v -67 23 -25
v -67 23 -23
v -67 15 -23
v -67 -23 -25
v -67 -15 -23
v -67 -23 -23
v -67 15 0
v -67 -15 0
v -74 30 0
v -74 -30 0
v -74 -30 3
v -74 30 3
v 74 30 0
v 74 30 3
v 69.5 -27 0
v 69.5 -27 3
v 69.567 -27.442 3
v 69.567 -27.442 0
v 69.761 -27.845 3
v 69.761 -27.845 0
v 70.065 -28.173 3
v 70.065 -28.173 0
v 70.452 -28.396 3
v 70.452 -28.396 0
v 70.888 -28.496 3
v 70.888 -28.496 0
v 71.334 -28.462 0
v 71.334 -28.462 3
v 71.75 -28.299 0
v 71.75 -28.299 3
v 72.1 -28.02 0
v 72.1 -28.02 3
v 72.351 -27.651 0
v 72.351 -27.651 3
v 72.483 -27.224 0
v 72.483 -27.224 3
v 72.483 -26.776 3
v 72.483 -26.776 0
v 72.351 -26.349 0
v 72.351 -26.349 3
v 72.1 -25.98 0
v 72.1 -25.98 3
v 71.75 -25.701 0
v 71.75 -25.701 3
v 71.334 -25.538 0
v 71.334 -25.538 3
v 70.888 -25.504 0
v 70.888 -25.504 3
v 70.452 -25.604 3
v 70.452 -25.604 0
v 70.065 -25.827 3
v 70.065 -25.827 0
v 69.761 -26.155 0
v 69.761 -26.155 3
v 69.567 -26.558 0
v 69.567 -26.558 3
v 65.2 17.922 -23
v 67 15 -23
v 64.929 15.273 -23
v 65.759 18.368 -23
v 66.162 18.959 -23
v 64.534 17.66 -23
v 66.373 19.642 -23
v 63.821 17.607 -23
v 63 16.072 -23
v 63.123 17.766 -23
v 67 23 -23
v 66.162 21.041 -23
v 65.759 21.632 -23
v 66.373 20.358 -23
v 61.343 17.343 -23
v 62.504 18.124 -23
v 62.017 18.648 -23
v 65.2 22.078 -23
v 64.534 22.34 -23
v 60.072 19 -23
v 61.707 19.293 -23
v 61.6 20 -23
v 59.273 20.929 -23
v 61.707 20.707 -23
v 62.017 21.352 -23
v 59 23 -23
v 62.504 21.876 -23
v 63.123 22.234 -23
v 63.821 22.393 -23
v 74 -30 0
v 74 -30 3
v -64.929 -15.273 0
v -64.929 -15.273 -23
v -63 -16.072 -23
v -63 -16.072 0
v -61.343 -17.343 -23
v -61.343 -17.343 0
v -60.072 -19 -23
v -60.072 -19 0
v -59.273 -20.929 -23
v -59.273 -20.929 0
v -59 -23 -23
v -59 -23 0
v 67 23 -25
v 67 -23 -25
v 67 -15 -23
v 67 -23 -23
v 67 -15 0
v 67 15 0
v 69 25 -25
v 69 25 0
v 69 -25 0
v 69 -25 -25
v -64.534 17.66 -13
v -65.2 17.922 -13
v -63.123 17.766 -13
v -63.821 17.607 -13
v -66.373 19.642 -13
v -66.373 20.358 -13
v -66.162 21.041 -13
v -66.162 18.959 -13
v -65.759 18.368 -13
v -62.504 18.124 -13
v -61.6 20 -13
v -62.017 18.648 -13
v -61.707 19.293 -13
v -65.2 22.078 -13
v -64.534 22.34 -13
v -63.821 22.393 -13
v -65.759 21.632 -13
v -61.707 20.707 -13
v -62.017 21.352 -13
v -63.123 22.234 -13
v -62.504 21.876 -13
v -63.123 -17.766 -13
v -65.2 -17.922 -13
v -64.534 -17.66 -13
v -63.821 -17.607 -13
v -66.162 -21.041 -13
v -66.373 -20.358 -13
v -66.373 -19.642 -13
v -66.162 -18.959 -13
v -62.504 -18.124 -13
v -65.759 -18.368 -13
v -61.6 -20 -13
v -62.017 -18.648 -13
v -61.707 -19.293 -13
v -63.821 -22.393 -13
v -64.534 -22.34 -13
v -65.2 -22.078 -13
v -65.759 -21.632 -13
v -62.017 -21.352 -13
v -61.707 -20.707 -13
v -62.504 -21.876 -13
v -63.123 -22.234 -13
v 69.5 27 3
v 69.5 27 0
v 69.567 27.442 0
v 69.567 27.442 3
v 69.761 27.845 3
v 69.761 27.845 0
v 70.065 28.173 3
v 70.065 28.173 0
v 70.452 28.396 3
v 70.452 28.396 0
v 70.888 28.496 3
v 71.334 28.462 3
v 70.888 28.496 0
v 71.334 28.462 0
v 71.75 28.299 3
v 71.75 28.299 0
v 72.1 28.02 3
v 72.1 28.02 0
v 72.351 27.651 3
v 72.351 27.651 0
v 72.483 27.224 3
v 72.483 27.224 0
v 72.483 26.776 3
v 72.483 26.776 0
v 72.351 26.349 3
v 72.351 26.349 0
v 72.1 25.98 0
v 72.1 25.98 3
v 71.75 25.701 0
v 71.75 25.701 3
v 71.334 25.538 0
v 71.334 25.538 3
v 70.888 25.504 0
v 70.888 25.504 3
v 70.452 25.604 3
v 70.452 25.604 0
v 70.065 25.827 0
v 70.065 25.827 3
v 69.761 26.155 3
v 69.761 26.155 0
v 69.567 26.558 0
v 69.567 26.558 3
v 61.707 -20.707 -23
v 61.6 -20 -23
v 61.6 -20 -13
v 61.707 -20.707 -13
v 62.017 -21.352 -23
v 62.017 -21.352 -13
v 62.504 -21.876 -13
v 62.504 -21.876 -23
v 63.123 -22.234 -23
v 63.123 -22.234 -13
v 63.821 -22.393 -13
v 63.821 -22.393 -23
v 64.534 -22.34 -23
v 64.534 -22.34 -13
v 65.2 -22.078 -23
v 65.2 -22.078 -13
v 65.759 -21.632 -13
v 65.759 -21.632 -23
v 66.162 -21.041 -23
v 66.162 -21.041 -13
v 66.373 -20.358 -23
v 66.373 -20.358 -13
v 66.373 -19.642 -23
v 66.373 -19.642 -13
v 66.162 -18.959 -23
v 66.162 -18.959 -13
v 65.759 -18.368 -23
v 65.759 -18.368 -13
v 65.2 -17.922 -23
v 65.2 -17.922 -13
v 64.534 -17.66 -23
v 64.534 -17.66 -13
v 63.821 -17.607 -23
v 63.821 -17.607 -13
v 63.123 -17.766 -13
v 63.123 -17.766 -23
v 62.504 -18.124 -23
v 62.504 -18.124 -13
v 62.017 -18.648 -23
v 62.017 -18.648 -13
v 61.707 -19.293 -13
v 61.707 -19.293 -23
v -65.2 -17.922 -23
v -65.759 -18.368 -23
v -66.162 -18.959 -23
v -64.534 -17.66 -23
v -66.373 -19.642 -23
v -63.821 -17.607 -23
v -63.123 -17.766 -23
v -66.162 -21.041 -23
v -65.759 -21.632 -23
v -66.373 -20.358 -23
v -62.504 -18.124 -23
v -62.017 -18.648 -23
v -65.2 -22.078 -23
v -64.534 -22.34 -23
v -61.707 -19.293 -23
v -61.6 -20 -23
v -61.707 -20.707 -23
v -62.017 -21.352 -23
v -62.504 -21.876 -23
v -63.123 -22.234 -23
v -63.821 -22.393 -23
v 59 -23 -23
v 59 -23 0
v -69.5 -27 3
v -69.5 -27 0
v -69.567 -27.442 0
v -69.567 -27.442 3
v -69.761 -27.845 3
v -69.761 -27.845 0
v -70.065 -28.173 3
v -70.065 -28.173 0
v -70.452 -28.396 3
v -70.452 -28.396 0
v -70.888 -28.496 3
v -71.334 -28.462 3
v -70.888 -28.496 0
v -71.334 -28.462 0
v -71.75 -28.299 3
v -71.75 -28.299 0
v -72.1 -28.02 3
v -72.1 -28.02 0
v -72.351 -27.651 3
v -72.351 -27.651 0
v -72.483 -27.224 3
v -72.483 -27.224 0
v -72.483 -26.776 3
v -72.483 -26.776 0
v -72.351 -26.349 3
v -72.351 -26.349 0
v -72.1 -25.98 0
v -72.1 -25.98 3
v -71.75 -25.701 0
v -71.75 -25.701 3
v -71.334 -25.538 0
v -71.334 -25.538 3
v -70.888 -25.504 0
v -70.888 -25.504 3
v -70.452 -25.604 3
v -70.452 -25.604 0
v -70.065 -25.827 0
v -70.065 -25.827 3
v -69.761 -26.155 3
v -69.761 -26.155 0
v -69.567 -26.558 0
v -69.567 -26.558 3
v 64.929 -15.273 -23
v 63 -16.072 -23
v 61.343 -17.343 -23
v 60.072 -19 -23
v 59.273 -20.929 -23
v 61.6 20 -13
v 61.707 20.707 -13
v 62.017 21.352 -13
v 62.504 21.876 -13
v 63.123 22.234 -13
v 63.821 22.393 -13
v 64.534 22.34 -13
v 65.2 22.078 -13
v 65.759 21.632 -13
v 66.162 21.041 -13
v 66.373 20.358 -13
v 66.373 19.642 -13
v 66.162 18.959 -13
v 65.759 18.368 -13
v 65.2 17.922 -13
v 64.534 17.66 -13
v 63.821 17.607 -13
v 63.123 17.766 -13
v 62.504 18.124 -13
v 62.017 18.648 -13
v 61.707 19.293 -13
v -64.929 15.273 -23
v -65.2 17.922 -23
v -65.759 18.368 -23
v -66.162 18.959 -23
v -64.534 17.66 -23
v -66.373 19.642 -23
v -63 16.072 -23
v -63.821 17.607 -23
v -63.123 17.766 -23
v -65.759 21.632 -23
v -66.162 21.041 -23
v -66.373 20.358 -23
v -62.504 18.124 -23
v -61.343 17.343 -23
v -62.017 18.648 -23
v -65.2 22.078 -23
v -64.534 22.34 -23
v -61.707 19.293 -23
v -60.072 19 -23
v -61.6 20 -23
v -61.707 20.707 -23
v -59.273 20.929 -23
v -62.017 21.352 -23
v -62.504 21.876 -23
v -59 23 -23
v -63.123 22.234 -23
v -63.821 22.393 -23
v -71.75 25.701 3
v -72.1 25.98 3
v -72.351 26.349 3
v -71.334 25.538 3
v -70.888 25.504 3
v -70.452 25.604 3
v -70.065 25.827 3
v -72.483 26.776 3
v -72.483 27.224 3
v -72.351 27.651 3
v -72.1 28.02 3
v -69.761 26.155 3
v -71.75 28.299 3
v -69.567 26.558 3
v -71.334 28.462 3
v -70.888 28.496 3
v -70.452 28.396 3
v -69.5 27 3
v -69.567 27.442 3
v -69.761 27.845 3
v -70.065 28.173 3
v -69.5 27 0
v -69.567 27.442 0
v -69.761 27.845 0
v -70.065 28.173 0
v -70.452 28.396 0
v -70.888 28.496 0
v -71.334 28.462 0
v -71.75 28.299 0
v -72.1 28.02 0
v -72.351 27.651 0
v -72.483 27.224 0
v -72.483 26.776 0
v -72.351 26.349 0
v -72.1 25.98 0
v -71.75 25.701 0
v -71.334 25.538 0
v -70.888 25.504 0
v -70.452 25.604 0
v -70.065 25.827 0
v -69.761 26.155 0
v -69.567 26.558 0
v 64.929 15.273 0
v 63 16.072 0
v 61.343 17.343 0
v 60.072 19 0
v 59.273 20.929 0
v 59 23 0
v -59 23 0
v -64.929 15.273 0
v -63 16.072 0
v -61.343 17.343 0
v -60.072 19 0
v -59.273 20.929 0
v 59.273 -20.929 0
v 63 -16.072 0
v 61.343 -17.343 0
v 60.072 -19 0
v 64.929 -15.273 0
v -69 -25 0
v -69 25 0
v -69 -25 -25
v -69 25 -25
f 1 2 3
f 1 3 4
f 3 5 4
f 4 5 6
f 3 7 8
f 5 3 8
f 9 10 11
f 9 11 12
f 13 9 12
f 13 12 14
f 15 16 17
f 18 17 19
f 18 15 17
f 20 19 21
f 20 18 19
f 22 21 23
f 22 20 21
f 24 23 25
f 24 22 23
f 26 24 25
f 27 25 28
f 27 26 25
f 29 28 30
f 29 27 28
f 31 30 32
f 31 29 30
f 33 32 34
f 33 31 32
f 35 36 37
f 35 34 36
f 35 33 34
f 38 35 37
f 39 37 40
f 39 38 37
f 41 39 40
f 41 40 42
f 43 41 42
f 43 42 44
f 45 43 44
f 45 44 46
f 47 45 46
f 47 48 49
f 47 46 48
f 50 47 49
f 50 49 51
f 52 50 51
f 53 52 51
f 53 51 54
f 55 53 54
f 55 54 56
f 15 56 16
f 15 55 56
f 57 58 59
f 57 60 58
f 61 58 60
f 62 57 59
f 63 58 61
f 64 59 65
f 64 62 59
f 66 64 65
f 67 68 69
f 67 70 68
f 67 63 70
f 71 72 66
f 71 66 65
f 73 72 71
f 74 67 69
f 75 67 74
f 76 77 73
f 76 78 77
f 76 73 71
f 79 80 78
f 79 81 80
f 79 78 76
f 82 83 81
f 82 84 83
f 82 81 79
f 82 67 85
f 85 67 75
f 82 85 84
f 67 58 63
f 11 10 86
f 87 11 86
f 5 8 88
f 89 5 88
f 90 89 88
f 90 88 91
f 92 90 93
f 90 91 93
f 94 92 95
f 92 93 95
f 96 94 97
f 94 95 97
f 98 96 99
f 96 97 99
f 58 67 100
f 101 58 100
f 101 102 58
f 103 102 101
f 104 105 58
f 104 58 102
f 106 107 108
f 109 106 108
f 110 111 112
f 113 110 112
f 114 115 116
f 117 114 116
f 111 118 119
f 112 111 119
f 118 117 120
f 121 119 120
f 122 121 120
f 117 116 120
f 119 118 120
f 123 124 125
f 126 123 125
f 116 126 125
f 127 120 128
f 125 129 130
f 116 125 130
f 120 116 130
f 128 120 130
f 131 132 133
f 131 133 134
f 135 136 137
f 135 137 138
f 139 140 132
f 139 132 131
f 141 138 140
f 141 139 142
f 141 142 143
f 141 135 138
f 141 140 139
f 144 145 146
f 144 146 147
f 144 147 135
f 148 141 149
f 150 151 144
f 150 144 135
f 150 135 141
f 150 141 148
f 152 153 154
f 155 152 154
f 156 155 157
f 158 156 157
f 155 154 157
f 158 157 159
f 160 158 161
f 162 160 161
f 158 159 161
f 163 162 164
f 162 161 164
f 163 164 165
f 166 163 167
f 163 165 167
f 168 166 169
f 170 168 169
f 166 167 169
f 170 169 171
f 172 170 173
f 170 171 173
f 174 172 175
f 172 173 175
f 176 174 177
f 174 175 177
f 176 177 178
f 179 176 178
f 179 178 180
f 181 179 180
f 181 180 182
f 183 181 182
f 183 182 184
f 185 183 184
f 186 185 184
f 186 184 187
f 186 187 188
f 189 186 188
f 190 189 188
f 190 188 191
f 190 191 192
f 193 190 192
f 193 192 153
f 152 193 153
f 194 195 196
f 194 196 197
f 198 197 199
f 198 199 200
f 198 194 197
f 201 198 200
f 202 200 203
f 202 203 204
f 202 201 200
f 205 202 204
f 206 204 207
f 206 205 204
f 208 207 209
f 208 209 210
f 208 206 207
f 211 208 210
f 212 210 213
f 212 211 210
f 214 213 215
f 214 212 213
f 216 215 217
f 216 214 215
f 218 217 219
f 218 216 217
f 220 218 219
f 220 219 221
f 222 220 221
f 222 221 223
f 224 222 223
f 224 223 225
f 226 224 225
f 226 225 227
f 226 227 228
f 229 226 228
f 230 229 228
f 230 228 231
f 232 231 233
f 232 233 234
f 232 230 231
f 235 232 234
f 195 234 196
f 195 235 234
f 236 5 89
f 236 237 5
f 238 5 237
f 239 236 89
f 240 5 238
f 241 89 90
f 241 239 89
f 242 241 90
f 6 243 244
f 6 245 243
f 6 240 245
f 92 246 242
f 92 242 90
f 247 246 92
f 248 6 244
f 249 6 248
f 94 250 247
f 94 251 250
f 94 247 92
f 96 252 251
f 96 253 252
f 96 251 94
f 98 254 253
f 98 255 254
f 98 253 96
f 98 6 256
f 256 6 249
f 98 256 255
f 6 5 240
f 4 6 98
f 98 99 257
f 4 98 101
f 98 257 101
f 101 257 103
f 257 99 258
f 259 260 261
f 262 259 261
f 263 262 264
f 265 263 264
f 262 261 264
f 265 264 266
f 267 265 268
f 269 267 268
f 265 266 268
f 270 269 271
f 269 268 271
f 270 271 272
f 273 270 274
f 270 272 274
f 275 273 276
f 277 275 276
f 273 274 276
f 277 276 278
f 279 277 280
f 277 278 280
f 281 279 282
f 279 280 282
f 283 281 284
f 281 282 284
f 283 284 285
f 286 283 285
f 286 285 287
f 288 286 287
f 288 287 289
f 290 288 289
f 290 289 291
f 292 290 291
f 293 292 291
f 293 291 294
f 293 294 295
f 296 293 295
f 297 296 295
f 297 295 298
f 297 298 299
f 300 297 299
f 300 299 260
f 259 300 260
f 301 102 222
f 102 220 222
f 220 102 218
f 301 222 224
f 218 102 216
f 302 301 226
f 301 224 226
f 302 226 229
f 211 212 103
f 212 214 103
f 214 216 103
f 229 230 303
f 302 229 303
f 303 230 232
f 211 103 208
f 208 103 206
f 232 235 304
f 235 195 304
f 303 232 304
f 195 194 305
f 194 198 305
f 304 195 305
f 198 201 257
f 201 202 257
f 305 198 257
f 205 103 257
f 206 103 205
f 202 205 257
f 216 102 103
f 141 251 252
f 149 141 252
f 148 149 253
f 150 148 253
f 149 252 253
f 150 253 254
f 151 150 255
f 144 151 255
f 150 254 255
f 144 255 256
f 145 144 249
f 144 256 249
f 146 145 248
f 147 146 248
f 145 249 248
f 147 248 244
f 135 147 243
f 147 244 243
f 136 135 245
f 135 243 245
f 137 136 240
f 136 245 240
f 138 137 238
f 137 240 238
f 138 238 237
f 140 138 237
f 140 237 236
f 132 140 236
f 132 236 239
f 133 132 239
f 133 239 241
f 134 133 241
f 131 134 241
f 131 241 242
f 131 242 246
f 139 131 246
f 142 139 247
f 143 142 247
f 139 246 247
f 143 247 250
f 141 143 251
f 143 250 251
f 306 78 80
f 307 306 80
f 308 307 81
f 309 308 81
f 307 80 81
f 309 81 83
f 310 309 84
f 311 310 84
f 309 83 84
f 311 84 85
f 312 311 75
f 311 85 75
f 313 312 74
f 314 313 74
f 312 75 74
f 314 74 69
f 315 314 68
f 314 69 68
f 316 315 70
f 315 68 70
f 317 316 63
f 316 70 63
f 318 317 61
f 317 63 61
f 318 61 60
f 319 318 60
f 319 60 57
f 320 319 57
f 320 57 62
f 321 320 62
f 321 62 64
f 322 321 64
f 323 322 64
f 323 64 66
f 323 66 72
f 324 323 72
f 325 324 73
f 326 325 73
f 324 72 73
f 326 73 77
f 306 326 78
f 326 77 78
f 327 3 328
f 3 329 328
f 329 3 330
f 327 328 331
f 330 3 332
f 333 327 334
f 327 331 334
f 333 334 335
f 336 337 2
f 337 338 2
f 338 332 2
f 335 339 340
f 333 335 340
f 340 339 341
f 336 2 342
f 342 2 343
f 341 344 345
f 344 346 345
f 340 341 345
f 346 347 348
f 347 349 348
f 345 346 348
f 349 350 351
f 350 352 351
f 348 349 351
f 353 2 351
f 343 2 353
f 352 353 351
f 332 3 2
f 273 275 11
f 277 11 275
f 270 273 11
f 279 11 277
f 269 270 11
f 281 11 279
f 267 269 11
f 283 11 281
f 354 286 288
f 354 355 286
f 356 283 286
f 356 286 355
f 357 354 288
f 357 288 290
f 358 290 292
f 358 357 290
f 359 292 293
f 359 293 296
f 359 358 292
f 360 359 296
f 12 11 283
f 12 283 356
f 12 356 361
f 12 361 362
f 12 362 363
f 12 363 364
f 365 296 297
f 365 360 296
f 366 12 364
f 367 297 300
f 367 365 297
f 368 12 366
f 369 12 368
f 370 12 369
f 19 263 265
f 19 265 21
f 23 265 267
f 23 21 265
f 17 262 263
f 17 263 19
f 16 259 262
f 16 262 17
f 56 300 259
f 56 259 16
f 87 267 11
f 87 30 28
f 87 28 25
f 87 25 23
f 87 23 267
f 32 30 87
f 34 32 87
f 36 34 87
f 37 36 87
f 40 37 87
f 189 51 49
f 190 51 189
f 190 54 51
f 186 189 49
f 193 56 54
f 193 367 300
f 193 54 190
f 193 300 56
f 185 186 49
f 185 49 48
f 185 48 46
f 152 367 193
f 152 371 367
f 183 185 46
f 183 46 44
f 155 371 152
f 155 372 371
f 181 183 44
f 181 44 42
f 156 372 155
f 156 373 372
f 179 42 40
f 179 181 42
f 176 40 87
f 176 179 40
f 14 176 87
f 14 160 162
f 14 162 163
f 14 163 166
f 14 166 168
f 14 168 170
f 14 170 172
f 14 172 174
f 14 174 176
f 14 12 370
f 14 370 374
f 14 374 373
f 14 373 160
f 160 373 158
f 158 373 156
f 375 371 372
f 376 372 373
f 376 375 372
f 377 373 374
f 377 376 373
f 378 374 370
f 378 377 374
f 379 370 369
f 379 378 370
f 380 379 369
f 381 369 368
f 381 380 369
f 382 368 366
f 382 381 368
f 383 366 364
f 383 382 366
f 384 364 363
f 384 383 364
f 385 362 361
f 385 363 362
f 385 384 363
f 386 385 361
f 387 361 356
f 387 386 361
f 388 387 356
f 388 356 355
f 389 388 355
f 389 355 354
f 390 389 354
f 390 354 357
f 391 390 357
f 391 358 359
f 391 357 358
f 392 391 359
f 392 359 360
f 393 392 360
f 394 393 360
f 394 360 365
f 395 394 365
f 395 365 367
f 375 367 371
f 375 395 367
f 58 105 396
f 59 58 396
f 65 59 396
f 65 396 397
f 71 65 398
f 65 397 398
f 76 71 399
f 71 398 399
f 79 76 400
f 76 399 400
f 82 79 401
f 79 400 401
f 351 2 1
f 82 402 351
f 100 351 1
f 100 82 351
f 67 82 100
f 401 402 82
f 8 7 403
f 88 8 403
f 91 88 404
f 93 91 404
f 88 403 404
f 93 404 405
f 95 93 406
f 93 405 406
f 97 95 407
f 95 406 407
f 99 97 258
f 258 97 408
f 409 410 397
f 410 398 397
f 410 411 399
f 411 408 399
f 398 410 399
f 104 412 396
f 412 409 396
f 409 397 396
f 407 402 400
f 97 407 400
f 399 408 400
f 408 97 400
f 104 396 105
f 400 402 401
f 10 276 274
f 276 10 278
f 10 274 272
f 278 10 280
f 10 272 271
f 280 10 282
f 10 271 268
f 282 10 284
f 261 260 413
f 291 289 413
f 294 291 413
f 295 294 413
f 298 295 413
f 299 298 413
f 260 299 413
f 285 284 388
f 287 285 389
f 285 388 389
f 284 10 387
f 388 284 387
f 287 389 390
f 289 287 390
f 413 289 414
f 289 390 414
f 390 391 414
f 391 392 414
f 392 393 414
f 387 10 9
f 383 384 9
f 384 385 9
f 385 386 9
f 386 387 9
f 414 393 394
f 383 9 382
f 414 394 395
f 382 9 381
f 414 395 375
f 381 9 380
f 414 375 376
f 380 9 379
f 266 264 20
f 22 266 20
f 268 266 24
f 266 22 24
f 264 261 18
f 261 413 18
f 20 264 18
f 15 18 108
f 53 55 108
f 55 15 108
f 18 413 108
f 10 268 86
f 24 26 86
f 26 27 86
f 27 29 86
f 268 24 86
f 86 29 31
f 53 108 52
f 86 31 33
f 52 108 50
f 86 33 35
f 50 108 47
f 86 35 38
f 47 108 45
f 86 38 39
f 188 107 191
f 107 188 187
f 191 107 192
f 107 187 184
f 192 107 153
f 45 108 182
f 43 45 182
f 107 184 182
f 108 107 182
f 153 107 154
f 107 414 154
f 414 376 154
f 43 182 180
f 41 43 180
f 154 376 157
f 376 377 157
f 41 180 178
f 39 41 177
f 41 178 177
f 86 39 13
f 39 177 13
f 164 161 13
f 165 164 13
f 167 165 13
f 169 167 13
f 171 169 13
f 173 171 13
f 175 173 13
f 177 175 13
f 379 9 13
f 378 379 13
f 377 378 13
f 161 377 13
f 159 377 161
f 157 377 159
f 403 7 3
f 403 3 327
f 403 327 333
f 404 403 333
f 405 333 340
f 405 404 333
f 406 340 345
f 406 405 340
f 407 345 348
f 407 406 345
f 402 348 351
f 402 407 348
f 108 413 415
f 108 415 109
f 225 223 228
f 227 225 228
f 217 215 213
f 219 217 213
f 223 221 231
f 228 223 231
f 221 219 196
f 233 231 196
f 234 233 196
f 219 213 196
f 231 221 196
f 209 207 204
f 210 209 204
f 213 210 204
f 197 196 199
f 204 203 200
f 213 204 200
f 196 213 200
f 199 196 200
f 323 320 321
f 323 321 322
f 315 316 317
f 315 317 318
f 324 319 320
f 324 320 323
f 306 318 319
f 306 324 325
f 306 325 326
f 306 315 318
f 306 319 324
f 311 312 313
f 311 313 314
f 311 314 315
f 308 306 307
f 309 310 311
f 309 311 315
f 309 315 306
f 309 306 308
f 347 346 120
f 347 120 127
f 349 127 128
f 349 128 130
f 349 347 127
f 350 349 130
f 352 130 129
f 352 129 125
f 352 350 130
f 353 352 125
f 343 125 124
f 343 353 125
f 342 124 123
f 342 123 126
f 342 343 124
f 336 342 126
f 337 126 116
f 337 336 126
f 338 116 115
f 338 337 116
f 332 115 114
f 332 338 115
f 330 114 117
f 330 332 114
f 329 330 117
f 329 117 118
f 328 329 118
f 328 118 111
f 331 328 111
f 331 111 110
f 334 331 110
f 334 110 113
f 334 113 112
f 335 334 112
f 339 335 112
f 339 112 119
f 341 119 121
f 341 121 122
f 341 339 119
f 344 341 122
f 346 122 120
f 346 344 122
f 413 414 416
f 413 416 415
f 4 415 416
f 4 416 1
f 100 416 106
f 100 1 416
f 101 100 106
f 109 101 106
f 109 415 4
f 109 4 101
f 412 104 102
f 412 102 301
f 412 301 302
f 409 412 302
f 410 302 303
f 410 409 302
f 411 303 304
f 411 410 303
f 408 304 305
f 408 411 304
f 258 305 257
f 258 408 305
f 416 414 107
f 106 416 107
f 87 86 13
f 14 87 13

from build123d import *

# Parameters (mm, degrees)
SKETCH_W                   = 148
SKETCH_H                   = 60
PAD_DEPTH                  = 3
SKETCH002_W                = 138
SKETCH002_H                = 50
SKETCH002_W_2              = 134
SKETCH002_H_2              = 46
PAD001_DEPTH               = 25
SKETCH003_R                = 1.5
POCKET_DEPTH               = 327.272491
PAD002_DEPTH               = 23
SKETCH005_R                = 2.4
POCKET001_DEPTH            = 10
SKETCH003_MIRRORED_2_R     = 1.5
POCKET_MIRRORED_2_DEPTH    = 327.272491
PAD002_MIRRORED_2_DEPTH    = 23
SKETCH005_MIRRORED_2_R     = 2.4
POCKET001_MIRRORED_2_DEPTH = 10


with BuildPart() as part:
    # Sketch → Pad (new body)
    with BuildSketch(Plane.XY):
        Rectangle(SKETCH_W, SKETCH_H)
    extrude(amount=PAD_DEPTH)

    # Sketch002 (on Face5 of Pad) → Pad001 (join)
    with BuildSketch(Plane(origin=(0, 0, 0), x_dir=(1, 0, 0), z_dir=(0, 0, -1))):
        Rectangle(SKETCH002_W, SKETCH002_H)
        Rectangle(SKETCH002_W_2, SKETCH002_H_2, mode=Mode.SUBTRACT)
    extrude(amount=PAD001_DEPTH)

    # Sketch003 (on Face4 of Pad001) → Pocket (cut, through all)
    with BuildSketch(Plane(origin=(0, 0, 0), x_dir=(1, 0, 0), z_dir=(0, 0, -1))):
        with Locations((-71, 27)):
            Circle(SKETCH003_R)
    pocket = extrude(amount=-POCKET_DEPTH, mode=Mode.SUBTRACT)

    # Sketch004 (on Face17 of Pocket) → Pad002 (join)
    with BuildSketch(Plane(origin=(0, 0, 0), x_dir=(1, 0, 0), z_dir=(0, 0, -1))):
        with BuildLine():
            ThreePointArc((-67, 15), (-61.343146, 17.343146), (-59, 23))
            Line((-67, 23), (-59, 23))
            Line((-67, 23), (-67, 15))
        make_face()
    pad002 = extrude(amount=PAD002_DEPTH)

    # Sketch005 (on Face17 of Pad002) → Pocket001 (cut)
    with BuildSketch(Plane(origin=(0, 0, -23), x_dir=(1, 0, 0), z_dir=(0, 0, -1))):
        with Locations((-64, 20)):
            Circle(SKETCH005_R)
    pocket001 = extrude(amount=-POCKET001_DEPTH, mode=Mode.SUBTRACT)

    # Sketch003 Mirrored 2 → Pocket Mirrored 2 (cut, through all)
    with BuildSketch(Plane(origin=(0, 0, 0), x_dir=(-1, 0, 0), z_dir=(0, 0, 1))):
        with Locations((-71, 27)):
            Circle(SKETCH003_MIRRORED_2_R)
    pocket_mirrored_2 = extrude(amount=POCKET_MIRRORED_2_DEPTH, mode=Mode.SUBTRACT)

    # Sketch004 Mirrored 2 → Pad002 Mirrored 2 (add)
    with BuildSketch(Plane(origin=(0, 0, 0), x_dir=(-1, 0, 0), z_dir=(0, 0, 1))):
        with BuildLine():
            ThreePointArc((-67, 15), (-61.343146, 17.343146), (-59, 23))
            Line((-67, 23), (-59, 23))
            Line((-67, 23), (-67, 15))
        make_face()
    pad002_mirrored_2 = extrude(amount=-PAD002_MIRRORED_2_DEPTH)

    # Sketch005 Mirrored 2 → Pocket001 Mirrored 2 (cut)
    with BuildSketch(Plane(origin=(0, 0, -23), x_dir=(-1, 0, 0), z_dir=(0, 0, 1))):
        with Locations((-64, 20)):
            Circle(SKETCH005_MIRRORED_2_R)
    pocket001_mirrored_2 = extrude(amount=POCKET001_MIRRORED_2_DEPTH, mode=Mode.SUBTRACT)

    # Mirrored001: Pocket, Pad002, Pocket001, Pocket Mirrored 2, Pad002 Mirrored 2, Pocket001 Mirrored 2 across Sketch003 H_Axis
    add(pocket.mirror(Plane(origin=(0, 0, 0), x_dir=(0, 0, -1), z_dir=(0, -1, 0))), mode=Mode.SUBTRACT)
    add(pad002.mirror(Plane(origin=(0, 0, 0), x_dir=(0, 0, -1), z_dir=(0, -1, 0))))
    add(pocket001.mirror(Plane(origin=(0, 0, 0), x_dir=(0, 0, -1), z_dir=(0, -1, 0))), mode=Mode.SUBTRACT)
    add(pocket_mirrored_2.mirror(Plane(origin=(0, 0, 0), x_dir=(0, 0, -1), z_dir=(0, -1, 0))), mode=Mode.SUBTRACT)
    add(pad002_mirrored_2.mirror(Plane(origin=(0, 0, 0), x_dir=(0, 0, -1), z_dir=(0, -1, 0))))
    add(pocket001_mirrored_2.mirror(Plane(origin=(0, 0, 0), x_dir=(0, 0, -1), z_dir=(0, -1, 0))), mode=Mode.SUBTRACT)


solid = part.part
